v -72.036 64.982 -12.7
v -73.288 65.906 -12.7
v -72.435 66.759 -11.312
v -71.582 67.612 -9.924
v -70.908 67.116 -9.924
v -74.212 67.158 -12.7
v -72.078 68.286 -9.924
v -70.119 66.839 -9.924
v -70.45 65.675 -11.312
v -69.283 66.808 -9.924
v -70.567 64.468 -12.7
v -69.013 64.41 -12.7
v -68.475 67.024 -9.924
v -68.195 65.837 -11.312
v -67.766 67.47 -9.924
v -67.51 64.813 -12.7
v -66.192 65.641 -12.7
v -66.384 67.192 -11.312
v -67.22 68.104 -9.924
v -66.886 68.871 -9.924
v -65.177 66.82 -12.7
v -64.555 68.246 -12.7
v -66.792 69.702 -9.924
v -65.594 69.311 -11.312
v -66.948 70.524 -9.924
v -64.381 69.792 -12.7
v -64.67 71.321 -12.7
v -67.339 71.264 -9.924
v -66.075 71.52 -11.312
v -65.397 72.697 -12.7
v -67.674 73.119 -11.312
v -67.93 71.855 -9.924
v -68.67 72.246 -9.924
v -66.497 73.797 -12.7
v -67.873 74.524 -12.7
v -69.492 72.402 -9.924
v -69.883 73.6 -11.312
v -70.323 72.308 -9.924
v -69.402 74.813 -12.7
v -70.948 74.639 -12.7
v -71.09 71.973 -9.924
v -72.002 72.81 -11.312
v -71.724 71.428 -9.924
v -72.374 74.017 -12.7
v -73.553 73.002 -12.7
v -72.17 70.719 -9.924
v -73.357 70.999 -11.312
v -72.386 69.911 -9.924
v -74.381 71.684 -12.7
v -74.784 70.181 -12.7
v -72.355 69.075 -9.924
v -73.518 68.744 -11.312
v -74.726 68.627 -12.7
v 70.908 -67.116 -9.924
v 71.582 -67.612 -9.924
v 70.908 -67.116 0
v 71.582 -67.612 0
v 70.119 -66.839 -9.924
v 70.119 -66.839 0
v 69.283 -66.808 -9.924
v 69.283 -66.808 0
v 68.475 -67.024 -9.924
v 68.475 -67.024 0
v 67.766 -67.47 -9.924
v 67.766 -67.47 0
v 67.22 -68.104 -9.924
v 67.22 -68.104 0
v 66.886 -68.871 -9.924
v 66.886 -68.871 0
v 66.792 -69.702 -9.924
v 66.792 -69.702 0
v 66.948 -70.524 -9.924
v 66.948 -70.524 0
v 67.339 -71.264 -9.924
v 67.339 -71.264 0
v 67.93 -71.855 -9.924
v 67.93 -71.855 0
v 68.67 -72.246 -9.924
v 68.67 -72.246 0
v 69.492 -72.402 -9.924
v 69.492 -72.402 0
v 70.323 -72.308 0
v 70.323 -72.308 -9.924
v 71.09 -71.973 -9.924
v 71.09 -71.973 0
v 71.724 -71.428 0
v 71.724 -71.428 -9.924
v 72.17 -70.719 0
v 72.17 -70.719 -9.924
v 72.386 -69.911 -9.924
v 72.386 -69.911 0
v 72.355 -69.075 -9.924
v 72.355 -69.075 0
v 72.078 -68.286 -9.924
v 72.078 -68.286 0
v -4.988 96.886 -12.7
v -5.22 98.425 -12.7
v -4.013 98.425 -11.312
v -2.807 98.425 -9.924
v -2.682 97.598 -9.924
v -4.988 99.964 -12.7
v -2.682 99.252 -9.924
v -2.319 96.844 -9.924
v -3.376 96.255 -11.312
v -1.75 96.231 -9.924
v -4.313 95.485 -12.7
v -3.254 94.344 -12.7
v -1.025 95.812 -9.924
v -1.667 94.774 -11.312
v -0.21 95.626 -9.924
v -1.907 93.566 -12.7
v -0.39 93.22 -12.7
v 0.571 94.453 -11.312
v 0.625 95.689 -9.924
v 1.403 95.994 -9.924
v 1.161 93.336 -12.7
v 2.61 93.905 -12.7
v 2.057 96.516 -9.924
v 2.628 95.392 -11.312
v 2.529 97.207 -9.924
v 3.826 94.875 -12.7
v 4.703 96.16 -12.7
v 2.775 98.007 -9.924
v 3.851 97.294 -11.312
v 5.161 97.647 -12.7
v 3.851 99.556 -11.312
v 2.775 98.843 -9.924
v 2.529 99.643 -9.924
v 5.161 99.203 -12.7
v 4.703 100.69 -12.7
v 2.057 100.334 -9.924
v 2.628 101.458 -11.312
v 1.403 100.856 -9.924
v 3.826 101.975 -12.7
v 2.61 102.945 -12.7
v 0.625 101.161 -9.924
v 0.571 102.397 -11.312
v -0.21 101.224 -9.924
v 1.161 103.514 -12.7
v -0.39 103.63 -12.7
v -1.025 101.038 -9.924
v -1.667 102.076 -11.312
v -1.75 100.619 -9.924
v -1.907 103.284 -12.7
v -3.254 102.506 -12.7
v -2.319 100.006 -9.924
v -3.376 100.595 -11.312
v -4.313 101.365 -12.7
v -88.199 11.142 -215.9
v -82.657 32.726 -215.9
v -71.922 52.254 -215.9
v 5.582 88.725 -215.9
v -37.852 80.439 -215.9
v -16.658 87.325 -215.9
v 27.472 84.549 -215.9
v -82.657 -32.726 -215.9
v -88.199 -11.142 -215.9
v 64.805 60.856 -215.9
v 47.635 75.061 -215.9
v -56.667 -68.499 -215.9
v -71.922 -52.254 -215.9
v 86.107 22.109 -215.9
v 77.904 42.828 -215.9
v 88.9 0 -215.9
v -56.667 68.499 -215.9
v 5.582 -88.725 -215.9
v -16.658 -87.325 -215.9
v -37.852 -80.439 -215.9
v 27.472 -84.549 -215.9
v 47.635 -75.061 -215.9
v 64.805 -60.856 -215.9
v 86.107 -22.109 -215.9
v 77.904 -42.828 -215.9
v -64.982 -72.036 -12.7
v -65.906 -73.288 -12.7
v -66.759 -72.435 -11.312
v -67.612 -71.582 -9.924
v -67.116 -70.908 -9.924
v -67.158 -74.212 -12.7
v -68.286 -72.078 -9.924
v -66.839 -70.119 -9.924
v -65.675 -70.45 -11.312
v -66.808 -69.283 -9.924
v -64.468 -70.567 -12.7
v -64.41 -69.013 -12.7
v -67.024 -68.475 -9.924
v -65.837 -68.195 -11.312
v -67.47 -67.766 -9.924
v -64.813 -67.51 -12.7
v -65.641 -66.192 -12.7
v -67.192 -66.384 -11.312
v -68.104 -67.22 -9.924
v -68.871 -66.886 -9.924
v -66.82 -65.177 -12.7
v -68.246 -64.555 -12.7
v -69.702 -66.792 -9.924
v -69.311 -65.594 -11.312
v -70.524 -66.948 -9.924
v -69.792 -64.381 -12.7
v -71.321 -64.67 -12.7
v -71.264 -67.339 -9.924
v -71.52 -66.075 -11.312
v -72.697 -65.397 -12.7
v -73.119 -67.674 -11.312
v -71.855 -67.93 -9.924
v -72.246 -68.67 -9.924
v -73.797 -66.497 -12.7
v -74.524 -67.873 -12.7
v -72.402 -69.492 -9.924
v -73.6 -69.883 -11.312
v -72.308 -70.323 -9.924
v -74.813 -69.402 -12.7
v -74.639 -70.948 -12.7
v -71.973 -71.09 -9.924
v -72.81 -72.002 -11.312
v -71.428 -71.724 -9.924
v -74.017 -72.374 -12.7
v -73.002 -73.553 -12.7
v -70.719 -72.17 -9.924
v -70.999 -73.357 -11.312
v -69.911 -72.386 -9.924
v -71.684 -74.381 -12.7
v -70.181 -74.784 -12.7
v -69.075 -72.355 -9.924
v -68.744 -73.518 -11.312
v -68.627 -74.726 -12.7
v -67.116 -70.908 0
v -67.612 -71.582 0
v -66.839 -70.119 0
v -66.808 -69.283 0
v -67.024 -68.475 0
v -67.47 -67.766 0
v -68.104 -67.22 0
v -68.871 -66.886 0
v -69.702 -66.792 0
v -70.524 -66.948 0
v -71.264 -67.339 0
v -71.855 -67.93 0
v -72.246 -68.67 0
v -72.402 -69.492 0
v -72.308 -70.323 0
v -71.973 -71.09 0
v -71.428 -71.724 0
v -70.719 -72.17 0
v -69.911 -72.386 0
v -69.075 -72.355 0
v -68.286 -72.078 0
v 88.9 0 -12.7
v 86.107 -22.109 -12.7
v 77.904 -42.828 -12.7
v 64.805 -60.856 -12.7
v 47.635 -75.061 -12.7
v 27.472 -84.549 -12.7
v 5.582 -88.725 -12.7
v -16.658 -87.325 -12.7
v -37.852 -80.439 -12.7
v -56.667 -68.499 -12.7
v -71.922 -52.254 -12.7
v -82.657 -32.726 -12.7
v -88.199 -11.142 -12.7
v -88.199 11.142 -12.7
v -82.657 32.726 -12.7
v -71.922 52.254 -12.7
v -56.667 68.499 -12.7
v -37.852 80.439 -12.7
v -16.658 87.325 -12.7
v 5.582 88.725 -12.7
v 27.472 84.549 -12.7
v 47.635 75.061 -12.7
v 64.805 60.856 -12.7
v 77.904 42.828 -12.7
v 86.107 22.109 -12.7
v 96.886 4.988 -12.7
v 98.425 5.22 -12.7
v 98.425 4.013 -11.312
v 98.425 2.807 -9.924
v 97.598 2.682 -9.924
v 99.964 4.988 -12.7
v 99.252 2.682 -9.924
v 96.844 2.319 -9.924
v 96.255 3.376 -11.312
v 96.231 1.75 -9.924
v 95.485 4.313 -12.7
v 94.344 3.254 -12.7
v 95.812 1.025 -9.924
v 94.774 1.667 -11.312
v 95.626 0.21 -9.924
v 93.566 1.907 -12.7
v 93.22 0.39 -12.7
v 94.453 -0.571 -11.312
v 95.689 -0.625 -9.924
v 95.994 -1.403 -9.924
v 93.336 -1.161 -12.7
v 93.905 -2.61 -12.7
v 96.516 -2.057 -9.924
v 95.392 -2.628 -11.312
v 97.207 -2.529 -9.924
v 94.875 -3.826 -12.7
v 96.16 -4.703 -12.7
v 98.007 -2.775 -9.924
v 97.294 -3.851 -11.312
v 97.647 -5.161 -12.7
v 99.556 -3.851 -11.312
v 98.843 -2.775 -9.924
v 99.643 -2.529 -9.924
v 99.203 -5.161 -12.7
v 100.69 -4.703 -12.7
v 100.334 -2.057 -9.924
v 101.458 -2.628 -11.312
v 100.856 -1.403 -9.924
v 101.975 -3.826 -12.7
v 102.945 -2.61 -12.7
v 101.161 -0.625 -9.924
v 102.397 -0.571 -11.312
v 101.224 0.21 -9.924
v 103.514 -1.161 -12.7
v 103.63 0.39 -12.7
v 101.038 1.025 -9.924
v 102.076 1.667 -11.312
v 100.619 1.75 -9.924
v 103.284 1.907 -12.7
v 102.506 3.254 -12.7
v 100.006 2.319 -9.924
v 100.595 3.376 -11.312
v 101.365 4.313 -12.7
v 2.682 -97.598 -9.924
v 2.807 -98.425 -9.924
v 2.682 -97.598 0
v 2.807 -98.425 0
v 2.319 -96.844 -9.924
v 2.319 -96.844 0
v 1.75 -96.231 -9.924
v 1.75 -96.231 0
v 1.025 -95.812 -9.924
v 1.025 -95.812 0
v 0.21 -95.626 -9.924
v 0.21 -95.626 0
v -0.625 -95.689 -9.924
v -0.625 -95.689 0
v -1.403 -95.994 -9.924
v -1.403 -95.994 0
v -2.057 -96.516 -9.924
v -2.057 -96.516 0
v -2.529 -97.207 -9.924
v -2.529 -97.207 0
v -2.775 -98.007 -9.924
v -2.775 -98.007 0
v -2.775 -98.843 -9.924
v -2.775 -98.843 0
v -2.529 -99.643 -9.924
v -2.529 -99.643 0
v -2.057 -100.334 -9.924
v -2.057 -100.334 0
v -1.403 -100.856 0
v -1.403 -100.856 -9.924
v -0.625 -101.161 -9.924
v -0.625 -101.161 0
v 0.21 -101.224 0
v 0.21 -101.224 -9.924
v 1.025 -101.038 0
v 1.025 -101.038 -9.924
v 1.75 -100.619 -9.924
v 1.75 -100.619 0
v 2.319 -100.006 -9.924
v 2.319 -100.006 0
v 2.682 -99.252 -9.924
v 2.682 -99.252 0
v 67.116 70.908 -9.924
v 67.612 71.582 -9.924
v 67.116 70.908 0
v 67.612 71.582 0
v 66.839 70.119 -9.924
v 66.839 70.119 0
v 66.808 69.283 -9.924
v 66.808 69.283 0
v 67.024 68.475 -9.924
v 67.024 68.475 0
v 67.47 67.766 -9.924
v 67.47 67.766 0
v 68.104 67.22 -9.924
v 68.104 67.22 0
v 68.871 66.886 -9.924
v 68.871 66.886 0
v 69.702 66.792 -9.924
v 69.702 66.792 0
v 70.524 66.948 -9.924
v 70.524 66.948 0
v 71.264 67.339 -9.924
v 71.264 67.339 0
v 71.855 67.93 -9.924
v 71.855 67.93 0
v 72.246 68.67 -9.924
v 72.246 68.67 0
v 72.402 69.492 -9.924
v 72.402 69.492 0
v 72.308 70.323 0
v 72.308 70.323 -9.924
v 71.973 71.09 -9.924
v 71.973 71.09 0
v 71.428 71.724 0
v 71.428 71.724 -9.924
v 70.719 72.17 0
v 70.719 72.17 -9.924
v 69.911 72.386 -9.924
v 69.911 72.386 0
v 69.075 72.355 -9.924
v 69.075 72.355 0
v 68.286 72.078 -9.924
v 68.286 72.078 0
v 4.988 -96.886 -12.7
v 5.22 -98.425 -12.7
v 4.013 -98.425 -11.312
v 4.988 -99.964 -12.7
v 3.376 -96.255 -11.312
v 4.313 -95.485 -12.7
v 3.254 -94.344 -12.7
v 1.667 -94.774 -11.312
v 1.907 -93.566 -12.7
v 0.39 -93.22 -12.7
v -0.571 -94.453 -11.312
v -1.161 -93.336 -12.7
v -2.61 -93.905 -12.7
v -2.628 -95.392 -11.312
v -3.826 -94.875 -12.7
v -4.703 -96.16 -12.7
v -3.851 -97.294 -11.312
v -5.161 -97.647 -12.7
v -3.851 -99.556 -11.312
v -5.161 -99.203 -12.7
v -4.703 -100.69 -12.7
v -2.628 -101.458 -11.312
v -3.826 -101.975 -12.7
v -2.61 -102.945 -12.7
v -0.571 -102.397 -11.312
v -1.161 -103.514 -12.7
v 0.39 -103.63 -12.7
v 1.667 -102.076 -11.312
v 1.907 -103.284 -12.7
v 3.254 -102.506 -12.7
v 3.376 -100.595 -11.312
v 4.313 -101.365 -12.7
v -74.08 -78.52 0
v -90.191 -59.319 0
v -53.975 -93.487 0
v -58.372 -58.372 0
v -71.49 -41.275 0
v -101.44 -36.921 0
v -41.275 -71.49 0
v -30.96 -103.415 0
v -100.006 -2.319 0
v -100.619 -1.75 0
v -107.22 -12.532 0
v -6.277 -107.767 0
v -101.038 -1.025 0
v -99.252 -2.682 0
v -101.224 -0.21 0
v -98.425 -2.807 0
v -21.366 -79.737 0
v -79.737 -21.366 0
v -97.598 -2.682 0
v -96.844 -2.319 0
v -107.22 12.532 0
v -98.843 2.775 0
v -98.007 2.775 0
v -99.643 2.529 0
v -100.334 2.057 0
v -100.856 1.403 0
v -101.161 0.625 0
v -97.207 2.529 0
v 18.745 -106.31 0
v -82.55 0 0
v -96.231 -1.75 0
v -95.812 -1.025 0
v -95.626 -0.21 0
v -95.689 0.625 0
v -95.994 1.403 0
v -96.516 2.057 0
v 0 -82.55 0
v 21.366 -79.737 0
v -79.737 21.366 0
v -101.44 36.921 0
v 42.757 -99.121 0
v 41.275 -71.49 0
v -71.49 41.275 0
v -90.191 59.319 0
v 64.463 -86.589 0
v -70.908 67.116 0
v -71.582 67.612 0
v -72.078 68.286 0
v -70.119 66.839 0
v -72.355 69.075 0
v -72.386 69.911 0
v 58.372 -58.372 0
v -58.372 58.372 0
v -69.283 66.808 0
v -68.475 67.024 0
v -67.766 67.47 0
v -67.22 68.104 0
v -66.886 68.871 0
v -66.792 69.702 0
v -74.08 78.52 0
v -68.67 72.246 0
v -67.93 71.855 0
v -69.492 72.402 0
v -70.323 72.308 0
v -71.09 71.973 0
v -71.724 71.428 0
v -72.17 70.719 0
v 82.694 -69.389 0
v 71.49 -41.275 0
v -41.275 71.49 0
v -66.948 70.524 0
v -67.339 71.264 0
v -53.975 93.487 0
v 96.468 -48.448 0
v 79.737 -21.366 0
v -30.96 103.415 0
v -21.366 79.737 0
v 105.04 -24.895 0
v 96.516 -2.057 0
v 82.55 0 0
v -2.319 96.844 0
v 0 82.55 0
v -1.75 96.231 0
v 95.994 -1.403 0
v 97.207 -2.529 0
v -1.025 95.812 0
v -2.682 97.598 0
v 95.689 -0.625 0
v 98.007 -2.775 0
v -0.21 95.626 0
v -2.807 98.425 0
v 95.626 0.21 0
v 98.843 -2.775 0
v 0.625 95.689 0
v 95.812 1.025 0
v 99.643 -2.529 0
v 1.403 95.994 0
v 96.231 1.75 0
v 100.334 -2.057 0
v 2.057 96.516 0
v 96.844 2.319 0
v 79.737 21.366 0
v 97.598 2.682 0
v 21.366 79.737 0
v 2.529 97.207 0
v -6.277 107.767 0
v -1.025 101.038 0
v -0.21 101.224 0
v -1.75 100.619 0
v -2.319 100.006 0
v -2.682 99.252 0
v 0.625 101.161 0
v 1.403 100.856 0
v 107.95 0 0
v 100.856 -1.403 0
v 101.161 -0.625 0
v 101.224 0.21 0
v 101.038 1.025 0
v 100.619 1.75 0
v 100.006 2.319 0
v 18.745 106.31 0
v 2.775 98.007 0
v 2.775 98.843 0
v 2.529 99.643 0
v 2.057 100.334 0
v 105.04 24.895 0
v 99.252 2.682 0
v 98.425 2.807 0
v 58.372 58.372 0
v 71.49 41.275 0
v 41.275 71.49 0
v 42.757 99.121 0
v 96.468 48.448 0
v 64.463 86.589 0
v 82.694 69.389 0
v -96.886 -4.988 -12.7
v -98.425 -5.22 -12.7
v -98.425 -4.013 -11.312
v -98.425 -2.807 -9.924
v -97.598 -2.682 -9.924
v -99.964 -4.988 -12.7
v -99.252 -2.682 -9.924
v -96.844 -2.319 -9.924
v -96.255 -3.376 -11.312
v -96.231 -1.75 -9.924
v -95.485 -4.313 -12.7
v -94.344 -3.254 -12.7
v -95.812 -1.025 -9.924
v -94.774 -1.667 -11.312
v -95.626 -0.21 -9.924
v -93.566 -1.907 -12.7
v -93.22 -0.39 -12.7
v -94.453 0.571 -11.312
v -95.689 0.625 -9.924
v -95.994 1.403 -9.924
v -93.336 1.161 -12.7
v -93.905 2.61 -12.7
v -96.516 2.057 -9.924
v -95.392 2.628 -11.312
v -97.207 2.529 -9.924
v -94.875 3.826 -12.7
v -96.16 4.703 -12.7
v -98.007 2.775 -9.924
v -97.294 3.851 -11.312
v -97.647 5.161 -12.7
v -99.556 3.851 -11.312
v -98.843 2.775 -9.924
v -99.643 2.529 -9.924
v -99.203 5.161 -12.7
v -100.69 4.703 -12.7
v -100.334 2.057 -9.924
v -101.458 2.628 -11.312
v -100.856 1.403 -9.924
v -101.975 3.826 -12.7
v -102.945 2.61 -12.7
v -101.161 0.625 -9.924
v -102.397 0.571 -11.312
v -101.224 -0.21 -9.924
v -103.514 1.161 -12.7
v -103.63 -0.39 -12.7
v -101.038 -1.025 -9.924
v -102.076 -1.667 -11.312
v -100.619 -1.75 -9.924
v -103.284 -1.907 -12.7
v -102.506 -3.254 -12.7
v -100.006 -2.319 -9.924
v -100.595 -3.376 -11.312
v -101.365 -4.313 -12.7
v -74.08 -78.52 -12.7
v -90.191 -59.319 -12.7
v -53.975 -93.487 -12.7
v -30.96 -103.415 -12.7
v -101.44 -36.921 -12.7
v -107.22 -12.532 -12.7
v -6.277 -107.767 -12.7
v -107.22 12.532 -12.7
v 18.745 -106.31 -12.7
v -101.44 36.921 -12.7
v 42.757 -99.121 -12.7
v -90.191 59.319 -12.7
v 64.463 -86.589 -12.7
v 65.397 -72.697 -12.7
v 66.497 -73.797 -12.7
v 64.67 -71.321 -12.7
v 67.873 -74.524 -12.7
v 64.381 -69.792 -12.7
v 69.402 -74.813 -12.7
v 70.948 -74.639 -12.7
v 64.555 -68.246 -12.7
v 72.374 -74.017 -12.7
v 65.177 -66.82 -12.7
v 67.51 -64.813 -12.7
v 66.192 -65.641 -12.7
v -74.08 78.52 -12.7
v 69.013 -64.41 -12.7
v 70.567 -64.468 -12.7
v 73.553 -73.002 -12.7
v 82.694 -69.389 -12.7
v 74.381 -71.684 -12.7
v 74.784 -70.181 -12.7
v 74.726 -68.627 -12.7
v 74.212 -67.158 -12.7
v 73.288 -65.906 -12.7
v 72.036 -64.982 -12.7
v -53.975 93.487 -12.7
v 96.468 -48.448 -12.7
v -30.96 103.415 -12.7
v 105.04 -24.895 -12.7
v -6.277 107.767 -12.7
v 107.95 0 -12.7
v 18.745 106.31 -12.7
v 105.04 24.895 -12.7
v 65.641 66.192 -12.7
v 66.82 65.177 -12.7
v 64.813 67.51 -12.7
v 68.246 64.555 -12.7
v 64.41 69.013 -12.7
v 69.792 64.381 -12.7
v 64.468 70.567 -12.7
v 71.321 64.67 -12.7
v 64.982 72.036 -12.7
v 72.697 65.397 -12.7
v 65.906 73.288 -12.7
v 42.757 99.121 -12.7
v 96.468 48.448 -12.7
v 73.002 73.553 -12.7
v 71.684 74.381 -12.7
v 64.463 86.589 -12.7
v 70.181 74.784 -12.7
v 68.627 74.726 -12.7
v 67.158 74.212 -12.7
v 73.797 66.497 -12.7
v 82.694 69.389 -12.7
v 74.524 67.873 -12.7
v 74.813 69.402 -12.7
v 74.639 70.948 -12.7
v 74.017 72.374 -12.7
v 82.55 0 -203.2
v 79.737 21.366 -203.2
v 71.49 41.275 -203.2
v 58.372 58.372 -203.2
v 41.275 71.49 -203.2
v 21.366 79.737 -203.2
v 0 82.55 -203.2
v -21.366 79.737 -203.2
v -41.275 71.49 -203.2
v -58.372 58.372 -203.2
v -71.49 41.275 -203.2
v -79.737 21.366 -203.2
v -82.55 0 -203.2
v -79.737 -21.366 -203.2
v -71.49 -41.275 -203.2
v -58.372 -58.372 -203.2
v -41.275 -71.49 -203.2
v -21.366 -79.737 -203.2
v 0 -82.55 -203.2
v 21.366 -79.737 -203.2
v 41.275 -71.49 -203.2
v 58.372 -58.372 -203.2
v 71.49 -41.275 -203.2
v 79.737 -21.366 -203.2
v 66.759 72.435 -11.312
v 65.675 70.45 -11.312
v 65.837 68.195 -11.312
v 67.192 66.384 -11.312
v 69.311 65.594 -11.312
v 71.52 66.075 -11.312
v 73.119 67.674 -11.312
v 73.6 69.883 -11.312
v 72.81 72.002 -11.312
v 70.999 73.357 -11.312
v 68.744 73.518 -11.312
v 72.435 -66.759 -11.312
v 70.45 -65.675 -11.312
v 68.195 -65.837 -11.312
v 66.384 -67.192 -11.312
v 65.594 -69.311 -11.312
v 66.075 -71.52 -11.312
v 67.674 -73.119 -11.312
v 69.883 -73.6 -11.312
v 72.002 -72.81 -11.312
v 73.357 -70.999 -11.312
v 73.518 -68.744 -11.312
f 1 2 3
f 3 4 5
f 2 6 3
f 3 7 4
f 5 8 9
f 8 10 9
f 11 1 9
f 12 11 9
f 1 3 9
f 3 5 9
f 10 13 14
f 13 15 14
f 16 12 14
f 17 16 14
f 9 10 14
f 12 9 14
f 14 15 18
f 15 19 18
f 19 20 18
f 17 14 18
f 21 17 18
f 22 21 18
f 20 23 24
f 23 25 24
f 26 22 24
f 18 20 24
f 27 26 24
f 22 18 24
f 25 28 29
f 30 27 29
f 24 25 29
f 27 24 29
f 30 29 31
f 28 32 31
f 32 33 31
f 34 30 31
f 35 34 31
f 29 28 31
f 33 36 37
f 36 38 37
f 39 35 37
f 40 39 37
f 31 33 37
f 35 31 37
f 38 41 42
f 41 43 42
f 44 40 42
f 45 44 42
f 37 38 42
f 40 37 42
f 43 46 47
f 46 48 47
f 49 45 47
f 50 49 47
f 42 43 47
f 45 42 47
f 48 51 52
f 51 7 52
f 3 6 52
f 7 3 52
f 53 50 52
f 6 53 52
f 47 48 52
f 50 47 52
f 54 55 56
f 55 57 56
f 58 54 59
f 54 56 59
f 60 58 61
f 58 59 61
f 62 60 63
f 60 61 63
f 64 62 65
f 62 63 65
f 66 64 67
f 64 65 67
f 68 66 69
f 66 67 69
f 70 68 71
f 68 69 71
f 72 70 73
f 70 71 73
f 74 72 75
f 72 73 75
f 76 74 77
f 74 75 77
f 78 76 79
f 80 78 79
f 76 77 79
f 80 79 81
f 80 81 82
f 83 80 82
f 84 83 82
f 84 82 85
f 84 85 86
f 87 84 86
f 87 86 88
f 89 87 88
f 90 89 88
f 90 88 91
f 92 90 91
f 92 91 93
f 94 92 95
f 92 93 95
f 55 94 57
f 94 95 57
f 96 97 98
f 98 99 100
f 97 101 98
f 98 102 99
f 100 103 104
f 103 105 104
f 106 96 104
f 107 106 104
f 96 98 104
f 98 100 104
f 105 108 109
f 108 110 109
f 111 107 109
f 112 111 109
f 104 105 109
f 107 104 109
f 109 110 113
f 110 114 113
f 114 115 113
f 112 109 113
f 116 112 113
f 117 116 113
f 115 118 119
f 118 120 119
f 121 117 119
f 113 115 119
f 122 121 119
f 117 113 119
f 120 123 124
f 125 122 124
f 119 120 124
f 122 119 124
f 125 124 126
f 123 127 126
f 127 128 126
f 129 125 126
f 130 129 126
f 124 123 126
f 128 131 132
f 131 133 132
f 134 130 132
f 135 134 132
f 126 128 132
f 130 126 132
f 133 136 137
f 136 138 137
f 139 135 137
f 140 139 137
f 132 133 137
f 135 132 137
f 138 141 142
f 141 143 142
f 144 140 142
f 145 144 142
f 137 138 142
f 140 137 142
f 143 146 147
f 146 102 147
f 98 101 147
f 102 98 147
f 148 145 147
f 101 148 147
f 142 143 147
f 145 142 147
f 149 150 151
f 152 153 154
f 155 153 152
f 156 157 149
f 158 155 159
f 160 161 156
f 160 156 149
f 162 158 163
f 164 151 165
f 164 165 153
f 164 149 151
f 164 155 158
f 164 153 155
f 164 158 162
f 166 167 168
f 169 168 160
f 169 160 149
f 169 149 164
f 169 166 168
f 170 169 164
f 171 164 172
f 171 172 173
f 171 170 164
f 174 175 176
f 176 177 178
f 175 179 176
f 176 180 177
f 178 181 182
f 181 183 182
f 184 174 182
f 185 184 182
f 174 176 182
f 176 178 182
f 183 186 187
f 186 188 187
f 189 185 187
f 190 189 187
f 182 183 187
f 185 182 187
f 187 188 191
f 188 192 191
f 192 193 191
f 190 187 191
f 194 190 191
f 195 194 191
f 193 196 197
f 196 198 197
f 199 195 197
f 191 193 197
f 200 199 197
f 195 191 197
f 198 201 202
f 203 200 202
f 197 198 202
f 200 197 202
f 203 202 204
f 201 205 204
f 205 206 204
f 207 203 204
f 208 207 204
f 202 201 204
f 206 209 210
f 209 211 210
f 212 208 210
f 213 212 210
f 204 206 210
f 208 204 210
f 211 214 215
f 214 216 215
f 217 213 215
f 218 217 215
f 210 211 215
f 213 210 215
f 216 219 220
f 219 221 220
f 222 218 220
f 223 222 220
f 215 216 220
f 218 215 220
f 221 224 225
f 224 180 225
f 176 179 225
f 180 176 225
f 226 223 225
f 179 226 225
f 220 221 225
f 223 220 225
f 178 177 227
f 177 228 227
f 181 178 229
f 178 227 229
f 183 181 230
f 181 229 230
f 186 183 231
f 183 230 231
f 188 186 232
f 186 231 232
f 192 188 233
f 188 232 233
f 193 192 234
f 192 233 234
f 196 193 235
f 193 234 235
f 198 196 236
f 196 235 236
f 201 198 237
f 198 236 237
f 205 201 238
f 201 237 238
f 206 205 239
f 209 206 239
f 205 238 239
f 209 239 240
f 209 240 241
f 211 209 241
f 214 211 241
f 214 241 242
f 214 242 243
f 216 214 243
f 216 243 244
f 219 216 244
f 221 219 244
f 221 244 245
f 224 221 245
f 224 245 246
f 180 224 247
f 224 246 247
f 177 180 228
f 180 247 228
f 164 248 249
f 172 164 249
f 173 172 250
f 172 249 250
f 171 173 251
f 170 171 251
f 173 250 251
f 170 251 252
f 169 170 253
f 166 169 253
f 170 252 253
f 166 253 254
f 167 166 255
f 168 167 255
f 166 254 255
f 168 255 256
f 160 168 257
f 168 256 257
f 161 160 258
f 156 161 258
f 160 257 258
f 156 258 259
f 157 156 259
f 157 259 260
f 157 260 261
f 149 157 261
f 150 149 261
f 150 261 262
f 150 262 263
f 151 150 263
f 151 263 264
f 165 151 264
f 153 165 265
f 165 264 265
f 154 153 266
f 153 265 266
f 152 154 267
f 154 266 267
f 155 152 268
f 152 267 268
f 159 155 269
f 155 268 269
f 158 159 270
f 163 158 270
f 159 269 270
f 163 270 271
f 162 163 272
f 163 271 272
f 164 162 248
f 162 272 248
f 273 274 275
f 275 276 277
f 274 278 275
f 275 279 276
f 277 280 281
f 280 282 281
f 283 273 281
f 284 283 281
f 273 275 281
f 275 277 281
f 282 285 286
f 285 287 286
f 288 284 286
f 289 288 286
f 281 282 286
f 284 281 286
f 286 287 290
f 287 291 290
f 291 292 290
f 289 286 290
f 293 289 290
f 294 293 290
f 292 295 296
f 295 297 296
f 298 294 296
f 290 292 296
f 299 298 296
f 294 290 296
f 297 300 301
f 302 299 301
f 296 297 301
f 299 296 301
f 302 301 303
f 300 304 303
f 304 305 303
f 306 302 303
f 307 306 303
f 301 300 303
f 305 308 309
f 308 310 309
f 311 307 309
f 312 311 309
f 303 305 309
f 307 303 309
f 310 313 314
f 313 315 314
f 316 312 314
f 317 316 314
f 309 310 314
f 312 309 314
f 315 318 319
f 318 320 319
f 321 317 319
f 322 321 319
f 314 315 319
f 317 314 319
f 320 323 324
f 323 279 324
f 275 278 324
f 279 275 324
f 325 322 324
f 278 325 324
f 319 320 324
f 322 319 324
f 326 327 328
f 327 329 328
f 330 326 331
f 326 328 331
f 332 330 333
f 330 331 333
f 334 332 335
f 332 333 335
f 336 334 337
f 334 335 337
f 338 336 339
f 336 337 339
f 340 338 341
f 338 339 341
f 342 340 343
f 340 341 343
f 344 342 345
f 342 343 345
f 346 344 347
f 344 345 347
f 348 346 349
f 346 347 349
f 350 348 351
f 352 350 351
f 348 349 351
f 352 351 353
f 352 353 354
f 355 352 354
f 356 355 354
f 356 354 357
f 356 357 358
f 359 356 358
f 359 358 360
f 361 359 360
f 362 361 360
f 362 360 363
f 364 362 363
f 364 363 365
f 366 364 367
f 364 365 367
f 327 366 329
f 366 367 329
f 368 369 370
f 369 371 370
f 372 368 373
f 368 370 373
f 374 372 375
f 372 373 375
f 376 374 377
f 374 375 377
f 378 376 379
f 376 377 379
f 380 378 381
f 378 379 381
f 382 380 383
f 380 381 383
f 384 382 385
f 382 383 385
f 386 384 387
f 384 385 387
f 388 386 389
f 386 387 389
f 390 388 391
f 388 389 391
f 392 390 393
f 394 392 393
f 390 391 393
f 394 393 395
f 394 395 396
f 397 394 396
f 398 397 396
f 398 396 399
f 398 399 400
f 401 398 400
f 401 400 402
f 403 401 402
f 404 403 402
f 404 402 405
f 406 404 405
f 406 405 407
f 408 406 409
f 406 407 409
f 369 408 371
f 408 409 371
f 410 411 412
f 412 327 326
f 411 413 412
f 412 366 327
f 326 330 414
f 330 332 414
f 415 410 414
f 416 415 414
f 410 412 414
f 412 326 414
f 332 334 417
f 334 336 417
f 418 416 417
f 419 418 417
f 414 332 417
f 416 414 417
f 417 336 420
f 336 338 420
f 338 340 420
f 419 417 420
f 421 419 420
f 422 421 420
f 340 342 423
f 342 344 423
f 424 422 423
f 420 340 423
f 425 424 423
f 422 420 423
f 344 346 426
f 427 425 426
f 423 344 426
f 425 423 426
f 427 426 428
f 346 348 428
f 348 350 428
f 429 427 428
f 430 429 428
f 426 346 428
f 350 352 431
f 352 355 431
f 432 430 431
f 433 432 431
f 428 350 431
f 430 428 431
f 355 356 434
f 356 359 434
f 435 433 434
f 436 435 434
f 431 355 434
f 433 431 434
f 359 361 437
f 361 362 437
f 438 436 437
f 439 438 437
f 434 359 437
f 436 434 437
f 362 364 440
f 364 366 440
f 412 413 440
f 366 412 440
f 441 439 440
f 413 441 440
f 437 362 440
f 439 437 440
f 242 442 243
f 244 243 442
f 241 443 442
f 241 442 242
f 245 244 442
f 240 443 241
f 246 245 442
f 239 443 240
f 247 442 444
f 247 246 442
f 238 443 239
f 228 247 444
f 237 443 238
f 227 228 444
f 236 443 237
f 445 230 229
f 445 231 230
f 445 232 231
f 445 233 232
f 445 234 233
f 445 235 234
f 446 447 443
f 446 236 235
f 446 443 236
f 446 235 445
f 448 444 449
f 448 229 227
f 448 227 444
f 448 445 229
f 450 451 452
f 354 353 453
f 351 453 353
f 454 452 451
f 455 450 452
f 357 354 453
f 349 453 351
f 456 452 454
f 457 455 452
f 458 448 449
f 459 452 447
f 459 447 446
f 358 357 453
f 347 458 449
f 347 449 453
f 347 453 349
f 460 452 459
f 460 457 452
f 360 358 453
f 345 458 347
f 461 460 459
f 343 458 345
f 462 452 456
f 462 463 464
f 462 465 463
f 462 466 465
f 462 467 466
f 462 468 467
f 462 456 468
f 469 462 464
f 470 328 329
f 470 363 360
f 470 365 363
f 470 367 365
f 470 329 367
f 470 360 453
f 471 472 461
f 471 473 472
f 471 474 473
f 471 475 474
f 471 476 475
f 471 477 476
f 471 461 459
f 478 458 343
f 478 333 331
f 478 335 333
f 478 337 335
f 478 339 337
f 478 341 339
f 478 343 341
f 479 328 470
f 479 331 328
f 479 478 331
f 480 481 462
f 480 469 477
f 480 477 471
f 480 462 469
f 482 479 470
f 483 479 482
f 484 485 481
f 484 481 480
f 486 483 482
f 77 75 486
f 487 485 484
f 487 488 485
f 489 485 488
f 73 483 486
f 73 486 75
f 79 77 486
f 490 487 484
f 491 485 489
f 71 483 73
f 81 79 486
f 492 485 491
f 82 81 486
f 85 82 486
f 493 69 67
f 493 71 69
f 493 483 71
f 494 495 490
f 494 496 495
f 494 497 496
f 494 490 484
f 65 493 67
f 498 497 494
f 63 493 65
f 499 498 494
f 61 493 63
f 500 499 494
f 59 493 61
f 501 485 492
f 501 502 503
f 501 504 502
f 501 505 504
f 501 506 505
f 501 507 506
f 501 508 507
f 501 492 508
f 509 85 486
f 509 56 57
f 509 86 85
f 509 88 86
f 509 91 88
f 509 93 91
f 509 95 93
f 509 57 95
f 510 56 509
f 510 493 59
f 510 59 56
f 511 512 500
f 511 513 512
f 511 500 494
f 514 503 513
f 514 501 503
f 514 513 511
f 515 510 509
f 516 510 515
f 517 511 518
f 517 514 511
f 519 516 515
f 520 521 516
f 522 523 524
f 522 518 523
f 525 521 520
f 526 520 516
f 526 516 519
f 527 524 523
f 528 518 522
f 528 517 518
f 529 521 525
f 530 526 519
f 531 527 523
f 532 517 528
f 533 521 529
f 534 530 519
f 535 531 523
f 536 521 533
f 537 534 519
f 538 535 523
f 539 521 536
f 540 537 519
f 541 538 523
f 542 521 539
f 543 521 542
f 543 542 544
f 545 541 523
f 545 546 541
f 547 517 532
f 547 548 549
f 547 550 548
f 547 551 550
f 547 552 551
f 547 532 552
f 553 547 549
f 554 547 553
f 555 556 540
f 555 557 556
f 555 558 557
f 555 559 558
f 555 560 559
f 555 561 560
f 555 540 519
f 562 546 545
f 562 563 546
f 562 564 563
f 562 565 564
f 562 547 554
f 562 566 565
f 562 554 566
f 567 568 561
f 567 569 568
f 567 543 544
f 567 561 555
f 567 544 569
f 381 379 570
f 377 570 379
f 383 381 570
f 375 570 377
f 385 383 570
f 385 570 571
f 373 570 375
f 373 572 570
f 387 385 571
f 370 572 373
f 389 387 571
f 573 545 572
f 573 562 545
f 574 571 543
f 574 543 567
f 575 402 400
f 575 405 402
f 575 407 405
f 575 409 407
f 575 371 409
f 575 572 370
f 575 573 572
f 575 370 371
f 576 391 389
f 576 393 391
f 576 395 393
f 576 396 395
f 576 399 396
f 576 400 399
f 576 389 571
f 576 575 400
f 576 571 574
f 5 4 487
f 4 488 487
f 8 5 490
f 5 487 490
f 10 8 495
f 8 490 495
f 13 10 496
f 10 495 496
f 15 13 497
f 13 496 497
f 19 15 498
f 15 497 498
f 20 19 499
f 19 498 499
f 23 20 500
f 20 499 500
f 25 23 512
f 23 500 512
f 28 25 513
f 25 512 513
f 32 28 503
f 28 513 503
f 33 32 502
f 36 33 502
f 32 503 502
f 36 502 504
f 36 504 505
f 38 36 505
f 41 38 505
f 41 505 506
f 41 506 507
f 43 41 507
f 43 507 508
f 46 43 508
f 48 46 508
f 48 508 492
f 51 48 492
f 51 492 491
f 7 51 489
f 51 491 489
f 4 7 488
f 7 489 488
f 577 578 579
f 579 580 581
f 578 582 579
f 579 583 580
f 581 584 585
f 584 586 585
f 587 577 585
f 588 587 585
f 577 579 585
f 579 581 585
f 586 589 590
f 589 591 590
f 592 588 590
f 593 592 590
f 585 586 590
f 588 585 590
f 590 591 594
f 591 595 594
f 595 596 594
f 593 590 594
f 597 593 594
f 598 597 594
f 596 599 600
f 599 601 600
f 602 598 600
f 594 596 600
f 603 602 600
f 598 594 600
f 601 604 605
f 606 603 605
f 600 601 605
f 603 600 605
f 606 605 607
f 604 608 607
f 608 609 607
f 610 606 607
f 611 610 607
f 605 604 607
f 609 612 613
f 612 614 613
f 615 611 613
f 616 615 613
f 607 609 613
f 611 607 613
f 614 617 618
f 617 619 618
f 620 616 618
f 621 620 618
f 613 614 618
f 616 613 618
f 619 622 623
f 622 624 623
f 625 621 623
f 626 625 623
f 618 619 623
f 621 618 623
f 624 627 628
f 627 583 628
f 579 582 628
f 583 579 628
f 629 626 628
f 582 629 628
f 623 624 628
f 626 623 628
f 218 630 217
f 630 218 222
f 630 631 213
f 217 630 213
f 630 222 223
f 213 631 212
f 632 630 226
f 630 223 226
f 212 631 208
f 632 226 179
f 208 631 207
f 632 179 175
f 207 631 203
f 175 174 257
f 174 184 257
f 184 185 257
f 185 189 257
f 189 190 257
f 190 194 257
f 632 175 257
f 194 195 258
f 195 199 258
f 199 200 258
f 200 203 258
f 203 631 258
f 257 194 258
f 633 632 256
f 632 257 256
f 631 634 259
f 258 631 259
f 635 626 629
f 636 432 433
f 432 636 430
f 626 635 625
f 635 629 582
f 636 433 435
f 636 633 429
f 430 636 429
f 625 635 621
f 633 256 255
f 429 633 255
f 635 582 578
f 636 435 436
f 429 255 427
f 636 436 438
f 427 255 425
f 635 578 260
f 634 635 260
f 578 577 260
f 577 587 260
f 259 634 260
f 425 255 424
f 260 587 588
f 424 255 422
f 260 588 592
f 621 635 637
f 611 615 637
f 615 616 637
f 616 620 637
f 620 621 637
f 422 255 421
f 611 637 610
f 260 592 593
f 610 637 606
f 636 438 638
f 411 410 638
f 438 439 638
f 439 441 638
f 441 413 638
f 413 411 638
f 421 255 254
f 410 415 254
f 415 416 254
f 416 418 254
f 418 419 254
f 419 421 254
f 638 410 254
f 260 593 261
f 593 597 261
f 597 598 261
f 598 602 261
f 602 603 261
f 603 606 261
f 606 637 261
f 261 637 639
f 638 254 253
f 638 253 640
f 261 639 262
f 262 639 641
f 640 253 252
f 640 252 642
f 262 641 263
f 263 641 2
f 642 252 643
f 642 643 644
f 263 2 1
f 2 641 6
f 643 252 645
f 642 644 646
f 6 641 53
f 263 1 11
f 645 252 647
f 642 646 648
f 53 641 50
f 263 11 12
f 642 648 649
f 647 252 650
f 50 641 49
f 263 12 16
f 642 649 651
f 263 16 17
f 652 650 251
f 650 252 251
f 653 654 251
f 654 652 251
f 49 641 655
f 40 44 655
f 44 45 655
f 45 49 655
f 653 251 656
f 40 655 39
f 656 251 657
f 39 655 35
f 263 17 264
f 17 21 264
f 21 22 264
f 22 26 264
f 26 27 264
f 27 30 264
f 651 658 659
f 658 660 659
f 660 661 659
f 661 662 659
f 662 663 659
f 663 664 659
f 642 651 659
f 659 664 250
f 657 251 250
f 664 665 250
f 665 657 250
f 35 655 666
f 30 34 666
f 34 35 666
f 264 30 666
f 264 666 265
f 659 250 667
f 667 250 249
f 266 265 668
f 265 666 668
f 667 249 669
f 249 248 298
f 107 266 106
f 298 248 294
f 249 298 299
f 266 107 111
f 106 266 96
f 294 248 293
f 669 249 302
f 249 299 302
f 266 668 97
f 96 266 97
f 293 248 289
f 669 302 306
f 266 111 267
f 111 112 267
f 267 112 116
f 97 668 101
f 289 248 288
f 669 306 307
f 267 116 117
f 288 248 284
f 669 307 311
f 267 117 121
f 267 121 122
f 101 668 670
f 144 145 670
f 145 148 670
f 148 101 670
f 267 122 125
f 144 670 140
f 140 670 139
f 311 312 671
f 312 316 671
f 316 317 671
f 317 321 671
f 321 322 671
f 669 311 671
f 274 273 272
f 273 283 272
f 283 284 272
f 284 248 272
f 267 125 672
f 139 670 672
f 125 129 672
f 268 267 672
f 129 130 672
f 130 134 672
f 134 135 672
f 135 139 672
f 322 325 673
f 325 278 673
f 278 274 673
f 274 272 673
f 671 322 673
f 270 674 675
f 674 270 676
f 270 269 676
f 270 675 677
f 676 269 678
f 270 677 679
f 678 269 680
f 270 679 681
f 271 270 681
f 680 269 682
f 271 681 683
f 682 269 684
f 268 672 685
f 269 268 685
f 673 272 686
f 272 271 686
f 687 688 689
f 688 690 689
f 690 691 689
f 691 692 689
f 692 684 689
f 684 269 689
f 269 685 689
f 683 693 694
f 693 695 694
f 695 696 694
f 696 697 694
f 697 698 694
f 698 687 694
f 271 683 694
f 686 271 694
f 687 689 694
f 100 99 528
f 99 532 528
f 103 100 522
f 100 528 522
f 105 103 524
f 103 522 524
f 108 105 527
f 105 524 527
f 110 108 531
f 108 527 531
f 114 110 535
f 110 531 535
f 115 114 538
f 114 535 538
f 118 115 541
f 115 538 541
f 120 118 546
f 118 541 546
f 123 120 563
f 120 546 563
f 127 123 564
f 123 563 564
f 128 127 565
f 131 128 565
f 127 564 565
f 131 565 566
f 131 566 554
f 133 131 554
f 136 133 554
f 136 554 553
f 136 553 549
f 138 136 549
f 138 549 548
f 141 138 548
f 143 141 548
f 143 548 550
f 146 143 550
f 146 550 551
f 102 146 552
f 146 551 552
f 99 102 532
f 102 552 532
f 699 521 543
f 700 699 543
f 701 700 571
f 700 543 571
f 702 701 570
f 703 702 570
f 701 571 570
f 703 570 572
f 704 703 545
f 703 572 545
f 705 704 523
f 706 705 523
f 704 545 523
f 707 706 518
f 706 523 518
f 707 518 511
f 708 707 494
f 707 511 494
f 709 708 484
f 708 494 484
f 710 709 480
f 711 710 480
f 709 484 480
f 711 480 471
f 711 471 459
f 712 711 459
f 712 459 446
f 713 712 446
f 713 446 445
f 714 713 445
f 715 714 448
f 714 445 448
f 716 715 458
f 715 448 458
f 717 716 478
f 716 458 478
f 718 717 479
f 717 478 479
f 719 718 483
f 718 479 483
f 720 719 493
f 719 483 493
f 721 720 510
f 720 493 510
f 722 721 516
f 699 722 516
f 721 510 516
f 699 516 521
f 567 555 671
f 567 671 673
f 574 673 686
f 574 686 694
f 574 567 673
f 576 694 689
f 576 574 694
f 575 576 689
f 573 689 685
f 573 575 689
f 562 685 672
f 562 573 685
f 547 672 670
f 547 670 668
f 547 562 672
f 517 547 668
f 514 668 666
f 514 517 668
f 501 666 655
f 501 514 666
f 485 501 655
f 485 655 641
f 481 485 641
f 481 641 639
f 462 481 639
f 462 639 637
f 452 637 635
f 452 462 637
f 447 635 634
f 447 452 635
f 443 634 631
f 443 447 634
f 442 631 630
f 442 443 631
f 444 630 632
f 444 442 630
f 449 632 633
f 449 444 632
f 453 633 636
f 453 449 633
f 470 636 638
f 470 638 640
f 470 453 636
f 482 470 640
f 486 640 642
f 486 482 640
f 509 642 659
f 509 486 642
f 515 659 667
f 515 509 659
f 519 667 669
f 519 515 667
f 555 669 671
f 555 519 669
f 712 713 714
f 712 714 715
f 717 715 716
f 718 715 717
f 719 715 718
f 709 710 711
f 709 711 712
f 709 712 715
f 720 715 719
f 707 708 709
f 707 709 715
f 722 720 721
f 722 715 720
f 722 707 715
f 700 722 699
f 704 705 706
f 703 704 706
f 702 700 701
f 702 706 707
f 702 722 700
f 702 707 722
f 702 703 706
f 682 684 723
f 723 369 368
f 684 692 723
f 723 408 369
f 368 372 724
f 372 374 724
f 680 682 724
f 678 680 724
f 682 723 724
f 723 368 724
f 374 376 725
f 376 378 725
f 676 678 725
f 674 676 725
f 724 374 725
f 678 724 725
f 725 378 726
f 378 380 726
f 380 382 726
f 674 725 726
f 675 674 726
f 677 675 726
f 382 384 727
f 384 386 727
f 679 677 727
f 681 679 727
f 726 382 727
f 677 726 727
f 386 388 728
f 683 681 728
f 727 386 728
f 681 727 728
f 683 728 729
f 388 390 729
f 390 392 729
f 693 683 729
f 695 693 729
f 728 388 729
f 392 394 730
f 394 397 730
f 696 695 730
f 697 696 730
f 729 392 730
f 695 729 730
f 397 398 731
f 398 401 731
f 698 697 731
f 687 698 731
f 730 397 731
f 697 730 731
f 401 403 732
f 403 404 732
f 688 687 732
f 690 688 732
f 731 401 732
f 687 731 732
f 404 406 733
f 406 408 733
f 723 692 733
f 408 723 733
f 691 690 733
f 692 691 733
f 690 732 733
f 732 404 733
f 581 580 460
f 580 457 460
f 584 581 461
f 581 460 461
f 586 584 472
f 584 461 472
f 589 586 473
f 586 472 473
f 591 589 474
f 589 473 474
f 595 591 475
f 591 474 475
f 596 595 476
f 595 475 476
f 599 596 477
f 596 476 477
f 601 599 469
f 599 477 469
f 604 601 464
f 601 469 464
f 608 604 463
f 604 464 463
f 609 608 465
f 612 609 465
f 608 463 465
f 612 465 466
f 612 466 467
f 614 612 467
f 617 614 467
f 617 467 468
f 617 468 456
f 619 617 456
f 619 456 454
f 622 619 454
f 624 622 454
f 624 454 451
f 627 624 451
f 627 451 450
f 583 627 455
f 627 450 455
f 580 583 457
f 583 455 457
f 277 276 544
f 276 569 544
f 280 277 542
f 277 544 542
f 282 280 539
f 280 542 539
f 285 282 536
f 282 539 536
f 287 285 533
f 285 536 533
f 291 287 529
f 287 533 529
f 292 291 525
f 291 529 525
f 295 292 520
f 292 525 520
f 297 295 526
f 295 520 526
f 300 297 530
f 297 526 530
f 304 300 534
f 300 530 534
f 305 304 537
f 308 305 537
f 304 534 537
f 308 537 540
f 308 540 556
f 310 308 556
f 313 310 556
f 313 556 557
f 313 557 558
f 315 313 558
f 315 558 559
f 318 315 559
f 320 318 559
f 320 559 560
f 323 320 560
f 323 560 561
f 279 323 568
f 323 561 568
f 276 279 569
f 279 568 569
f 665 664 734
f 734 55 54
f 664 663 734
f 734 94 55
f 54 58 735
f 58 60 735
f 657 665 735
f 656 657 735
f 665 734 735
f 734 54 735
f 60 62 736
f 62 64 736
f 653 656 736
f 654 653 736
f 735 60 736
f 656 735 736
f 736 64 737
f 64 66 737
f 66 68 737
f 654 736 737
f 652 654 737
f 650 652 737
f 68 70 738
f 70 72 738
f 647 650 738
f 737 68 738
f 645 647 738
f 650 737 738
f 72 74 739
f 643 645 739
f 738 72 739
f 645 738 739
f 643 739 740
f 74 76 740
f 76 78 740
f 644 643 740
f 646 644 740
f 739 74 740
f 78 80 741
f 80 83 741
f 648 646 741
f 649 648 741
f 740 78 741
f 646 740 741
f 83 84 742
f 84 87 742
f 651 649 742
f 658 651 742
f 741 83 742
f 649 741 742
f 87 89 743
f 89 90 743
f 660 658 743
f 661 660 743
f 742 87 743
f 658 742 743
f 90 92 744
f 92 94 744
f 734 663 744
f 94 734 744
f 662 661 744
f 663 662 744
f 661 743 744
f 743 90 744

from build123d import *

# Parameters (mm, degrees)
F0_R            = 107.95
F1_DEPTH        = 12.7
F2_R            = 88.9
F3_DEPTH        = 203.2
F4_R            = 82.55
F5_DEPTH        = 203.2
F7_D            = 5.6134
F7_CSINK_D      = 10.4394
F7_CSINK_ANGLE  = 82
F7_COPIES_COUNT = 8


# Not quite as in the source:
# - a pattern or mirror of a feature is missing from the dataset's text; its kind, count and spacing are read off the source's solid


with BuildPart() as f1:
    # F0 (on Top) → F1 (new body)
    with BuildSketch(Plane.XY):
        Circle(F0_R)
    extrude(amount=-F1_DEPTH)

    # F2 (on face) → F3 (join)
    with BuildSketch(Plane(origin=(0, 0, -12.7), x_dir=(1, 0, 0), z_dir=(0, 0, -1))):
        Circle(F2_R)
    extrude(amount=F3_DEPTH)

    # F4 (on face) → F5 (cut)
    with BuildSketch(Plane.XY):
        Circle(F4_R)
    extrude(amount=-F5_DEPTH, mode=Mode.SUBTRACT)

    # F7 (through all)
    with Locations(Plane(origin=(0, 0, -12.7), x_dir=(1, 0, 0), z_dir=(0, 0, -1))):
        with Locations((0, -98.425)):
            f7 = CounterSinkHole(F7_D / 2, F7_CSINK_D / 2, counter_sink_angle=F7_CSINK_ANGLE)

    # F7_copies: F7 ×8 about axis
    f7_copies_axis = Axis((0, 0, 0), (0, 0, 1))
    for i in range(1, F7_COPIES_COUNT):
        add(f7.rotate(f7_copies_axis, i * 360 / F7_COPIES_COUNT), mode=Mode.SUBTRACT)


solid = f1.part
